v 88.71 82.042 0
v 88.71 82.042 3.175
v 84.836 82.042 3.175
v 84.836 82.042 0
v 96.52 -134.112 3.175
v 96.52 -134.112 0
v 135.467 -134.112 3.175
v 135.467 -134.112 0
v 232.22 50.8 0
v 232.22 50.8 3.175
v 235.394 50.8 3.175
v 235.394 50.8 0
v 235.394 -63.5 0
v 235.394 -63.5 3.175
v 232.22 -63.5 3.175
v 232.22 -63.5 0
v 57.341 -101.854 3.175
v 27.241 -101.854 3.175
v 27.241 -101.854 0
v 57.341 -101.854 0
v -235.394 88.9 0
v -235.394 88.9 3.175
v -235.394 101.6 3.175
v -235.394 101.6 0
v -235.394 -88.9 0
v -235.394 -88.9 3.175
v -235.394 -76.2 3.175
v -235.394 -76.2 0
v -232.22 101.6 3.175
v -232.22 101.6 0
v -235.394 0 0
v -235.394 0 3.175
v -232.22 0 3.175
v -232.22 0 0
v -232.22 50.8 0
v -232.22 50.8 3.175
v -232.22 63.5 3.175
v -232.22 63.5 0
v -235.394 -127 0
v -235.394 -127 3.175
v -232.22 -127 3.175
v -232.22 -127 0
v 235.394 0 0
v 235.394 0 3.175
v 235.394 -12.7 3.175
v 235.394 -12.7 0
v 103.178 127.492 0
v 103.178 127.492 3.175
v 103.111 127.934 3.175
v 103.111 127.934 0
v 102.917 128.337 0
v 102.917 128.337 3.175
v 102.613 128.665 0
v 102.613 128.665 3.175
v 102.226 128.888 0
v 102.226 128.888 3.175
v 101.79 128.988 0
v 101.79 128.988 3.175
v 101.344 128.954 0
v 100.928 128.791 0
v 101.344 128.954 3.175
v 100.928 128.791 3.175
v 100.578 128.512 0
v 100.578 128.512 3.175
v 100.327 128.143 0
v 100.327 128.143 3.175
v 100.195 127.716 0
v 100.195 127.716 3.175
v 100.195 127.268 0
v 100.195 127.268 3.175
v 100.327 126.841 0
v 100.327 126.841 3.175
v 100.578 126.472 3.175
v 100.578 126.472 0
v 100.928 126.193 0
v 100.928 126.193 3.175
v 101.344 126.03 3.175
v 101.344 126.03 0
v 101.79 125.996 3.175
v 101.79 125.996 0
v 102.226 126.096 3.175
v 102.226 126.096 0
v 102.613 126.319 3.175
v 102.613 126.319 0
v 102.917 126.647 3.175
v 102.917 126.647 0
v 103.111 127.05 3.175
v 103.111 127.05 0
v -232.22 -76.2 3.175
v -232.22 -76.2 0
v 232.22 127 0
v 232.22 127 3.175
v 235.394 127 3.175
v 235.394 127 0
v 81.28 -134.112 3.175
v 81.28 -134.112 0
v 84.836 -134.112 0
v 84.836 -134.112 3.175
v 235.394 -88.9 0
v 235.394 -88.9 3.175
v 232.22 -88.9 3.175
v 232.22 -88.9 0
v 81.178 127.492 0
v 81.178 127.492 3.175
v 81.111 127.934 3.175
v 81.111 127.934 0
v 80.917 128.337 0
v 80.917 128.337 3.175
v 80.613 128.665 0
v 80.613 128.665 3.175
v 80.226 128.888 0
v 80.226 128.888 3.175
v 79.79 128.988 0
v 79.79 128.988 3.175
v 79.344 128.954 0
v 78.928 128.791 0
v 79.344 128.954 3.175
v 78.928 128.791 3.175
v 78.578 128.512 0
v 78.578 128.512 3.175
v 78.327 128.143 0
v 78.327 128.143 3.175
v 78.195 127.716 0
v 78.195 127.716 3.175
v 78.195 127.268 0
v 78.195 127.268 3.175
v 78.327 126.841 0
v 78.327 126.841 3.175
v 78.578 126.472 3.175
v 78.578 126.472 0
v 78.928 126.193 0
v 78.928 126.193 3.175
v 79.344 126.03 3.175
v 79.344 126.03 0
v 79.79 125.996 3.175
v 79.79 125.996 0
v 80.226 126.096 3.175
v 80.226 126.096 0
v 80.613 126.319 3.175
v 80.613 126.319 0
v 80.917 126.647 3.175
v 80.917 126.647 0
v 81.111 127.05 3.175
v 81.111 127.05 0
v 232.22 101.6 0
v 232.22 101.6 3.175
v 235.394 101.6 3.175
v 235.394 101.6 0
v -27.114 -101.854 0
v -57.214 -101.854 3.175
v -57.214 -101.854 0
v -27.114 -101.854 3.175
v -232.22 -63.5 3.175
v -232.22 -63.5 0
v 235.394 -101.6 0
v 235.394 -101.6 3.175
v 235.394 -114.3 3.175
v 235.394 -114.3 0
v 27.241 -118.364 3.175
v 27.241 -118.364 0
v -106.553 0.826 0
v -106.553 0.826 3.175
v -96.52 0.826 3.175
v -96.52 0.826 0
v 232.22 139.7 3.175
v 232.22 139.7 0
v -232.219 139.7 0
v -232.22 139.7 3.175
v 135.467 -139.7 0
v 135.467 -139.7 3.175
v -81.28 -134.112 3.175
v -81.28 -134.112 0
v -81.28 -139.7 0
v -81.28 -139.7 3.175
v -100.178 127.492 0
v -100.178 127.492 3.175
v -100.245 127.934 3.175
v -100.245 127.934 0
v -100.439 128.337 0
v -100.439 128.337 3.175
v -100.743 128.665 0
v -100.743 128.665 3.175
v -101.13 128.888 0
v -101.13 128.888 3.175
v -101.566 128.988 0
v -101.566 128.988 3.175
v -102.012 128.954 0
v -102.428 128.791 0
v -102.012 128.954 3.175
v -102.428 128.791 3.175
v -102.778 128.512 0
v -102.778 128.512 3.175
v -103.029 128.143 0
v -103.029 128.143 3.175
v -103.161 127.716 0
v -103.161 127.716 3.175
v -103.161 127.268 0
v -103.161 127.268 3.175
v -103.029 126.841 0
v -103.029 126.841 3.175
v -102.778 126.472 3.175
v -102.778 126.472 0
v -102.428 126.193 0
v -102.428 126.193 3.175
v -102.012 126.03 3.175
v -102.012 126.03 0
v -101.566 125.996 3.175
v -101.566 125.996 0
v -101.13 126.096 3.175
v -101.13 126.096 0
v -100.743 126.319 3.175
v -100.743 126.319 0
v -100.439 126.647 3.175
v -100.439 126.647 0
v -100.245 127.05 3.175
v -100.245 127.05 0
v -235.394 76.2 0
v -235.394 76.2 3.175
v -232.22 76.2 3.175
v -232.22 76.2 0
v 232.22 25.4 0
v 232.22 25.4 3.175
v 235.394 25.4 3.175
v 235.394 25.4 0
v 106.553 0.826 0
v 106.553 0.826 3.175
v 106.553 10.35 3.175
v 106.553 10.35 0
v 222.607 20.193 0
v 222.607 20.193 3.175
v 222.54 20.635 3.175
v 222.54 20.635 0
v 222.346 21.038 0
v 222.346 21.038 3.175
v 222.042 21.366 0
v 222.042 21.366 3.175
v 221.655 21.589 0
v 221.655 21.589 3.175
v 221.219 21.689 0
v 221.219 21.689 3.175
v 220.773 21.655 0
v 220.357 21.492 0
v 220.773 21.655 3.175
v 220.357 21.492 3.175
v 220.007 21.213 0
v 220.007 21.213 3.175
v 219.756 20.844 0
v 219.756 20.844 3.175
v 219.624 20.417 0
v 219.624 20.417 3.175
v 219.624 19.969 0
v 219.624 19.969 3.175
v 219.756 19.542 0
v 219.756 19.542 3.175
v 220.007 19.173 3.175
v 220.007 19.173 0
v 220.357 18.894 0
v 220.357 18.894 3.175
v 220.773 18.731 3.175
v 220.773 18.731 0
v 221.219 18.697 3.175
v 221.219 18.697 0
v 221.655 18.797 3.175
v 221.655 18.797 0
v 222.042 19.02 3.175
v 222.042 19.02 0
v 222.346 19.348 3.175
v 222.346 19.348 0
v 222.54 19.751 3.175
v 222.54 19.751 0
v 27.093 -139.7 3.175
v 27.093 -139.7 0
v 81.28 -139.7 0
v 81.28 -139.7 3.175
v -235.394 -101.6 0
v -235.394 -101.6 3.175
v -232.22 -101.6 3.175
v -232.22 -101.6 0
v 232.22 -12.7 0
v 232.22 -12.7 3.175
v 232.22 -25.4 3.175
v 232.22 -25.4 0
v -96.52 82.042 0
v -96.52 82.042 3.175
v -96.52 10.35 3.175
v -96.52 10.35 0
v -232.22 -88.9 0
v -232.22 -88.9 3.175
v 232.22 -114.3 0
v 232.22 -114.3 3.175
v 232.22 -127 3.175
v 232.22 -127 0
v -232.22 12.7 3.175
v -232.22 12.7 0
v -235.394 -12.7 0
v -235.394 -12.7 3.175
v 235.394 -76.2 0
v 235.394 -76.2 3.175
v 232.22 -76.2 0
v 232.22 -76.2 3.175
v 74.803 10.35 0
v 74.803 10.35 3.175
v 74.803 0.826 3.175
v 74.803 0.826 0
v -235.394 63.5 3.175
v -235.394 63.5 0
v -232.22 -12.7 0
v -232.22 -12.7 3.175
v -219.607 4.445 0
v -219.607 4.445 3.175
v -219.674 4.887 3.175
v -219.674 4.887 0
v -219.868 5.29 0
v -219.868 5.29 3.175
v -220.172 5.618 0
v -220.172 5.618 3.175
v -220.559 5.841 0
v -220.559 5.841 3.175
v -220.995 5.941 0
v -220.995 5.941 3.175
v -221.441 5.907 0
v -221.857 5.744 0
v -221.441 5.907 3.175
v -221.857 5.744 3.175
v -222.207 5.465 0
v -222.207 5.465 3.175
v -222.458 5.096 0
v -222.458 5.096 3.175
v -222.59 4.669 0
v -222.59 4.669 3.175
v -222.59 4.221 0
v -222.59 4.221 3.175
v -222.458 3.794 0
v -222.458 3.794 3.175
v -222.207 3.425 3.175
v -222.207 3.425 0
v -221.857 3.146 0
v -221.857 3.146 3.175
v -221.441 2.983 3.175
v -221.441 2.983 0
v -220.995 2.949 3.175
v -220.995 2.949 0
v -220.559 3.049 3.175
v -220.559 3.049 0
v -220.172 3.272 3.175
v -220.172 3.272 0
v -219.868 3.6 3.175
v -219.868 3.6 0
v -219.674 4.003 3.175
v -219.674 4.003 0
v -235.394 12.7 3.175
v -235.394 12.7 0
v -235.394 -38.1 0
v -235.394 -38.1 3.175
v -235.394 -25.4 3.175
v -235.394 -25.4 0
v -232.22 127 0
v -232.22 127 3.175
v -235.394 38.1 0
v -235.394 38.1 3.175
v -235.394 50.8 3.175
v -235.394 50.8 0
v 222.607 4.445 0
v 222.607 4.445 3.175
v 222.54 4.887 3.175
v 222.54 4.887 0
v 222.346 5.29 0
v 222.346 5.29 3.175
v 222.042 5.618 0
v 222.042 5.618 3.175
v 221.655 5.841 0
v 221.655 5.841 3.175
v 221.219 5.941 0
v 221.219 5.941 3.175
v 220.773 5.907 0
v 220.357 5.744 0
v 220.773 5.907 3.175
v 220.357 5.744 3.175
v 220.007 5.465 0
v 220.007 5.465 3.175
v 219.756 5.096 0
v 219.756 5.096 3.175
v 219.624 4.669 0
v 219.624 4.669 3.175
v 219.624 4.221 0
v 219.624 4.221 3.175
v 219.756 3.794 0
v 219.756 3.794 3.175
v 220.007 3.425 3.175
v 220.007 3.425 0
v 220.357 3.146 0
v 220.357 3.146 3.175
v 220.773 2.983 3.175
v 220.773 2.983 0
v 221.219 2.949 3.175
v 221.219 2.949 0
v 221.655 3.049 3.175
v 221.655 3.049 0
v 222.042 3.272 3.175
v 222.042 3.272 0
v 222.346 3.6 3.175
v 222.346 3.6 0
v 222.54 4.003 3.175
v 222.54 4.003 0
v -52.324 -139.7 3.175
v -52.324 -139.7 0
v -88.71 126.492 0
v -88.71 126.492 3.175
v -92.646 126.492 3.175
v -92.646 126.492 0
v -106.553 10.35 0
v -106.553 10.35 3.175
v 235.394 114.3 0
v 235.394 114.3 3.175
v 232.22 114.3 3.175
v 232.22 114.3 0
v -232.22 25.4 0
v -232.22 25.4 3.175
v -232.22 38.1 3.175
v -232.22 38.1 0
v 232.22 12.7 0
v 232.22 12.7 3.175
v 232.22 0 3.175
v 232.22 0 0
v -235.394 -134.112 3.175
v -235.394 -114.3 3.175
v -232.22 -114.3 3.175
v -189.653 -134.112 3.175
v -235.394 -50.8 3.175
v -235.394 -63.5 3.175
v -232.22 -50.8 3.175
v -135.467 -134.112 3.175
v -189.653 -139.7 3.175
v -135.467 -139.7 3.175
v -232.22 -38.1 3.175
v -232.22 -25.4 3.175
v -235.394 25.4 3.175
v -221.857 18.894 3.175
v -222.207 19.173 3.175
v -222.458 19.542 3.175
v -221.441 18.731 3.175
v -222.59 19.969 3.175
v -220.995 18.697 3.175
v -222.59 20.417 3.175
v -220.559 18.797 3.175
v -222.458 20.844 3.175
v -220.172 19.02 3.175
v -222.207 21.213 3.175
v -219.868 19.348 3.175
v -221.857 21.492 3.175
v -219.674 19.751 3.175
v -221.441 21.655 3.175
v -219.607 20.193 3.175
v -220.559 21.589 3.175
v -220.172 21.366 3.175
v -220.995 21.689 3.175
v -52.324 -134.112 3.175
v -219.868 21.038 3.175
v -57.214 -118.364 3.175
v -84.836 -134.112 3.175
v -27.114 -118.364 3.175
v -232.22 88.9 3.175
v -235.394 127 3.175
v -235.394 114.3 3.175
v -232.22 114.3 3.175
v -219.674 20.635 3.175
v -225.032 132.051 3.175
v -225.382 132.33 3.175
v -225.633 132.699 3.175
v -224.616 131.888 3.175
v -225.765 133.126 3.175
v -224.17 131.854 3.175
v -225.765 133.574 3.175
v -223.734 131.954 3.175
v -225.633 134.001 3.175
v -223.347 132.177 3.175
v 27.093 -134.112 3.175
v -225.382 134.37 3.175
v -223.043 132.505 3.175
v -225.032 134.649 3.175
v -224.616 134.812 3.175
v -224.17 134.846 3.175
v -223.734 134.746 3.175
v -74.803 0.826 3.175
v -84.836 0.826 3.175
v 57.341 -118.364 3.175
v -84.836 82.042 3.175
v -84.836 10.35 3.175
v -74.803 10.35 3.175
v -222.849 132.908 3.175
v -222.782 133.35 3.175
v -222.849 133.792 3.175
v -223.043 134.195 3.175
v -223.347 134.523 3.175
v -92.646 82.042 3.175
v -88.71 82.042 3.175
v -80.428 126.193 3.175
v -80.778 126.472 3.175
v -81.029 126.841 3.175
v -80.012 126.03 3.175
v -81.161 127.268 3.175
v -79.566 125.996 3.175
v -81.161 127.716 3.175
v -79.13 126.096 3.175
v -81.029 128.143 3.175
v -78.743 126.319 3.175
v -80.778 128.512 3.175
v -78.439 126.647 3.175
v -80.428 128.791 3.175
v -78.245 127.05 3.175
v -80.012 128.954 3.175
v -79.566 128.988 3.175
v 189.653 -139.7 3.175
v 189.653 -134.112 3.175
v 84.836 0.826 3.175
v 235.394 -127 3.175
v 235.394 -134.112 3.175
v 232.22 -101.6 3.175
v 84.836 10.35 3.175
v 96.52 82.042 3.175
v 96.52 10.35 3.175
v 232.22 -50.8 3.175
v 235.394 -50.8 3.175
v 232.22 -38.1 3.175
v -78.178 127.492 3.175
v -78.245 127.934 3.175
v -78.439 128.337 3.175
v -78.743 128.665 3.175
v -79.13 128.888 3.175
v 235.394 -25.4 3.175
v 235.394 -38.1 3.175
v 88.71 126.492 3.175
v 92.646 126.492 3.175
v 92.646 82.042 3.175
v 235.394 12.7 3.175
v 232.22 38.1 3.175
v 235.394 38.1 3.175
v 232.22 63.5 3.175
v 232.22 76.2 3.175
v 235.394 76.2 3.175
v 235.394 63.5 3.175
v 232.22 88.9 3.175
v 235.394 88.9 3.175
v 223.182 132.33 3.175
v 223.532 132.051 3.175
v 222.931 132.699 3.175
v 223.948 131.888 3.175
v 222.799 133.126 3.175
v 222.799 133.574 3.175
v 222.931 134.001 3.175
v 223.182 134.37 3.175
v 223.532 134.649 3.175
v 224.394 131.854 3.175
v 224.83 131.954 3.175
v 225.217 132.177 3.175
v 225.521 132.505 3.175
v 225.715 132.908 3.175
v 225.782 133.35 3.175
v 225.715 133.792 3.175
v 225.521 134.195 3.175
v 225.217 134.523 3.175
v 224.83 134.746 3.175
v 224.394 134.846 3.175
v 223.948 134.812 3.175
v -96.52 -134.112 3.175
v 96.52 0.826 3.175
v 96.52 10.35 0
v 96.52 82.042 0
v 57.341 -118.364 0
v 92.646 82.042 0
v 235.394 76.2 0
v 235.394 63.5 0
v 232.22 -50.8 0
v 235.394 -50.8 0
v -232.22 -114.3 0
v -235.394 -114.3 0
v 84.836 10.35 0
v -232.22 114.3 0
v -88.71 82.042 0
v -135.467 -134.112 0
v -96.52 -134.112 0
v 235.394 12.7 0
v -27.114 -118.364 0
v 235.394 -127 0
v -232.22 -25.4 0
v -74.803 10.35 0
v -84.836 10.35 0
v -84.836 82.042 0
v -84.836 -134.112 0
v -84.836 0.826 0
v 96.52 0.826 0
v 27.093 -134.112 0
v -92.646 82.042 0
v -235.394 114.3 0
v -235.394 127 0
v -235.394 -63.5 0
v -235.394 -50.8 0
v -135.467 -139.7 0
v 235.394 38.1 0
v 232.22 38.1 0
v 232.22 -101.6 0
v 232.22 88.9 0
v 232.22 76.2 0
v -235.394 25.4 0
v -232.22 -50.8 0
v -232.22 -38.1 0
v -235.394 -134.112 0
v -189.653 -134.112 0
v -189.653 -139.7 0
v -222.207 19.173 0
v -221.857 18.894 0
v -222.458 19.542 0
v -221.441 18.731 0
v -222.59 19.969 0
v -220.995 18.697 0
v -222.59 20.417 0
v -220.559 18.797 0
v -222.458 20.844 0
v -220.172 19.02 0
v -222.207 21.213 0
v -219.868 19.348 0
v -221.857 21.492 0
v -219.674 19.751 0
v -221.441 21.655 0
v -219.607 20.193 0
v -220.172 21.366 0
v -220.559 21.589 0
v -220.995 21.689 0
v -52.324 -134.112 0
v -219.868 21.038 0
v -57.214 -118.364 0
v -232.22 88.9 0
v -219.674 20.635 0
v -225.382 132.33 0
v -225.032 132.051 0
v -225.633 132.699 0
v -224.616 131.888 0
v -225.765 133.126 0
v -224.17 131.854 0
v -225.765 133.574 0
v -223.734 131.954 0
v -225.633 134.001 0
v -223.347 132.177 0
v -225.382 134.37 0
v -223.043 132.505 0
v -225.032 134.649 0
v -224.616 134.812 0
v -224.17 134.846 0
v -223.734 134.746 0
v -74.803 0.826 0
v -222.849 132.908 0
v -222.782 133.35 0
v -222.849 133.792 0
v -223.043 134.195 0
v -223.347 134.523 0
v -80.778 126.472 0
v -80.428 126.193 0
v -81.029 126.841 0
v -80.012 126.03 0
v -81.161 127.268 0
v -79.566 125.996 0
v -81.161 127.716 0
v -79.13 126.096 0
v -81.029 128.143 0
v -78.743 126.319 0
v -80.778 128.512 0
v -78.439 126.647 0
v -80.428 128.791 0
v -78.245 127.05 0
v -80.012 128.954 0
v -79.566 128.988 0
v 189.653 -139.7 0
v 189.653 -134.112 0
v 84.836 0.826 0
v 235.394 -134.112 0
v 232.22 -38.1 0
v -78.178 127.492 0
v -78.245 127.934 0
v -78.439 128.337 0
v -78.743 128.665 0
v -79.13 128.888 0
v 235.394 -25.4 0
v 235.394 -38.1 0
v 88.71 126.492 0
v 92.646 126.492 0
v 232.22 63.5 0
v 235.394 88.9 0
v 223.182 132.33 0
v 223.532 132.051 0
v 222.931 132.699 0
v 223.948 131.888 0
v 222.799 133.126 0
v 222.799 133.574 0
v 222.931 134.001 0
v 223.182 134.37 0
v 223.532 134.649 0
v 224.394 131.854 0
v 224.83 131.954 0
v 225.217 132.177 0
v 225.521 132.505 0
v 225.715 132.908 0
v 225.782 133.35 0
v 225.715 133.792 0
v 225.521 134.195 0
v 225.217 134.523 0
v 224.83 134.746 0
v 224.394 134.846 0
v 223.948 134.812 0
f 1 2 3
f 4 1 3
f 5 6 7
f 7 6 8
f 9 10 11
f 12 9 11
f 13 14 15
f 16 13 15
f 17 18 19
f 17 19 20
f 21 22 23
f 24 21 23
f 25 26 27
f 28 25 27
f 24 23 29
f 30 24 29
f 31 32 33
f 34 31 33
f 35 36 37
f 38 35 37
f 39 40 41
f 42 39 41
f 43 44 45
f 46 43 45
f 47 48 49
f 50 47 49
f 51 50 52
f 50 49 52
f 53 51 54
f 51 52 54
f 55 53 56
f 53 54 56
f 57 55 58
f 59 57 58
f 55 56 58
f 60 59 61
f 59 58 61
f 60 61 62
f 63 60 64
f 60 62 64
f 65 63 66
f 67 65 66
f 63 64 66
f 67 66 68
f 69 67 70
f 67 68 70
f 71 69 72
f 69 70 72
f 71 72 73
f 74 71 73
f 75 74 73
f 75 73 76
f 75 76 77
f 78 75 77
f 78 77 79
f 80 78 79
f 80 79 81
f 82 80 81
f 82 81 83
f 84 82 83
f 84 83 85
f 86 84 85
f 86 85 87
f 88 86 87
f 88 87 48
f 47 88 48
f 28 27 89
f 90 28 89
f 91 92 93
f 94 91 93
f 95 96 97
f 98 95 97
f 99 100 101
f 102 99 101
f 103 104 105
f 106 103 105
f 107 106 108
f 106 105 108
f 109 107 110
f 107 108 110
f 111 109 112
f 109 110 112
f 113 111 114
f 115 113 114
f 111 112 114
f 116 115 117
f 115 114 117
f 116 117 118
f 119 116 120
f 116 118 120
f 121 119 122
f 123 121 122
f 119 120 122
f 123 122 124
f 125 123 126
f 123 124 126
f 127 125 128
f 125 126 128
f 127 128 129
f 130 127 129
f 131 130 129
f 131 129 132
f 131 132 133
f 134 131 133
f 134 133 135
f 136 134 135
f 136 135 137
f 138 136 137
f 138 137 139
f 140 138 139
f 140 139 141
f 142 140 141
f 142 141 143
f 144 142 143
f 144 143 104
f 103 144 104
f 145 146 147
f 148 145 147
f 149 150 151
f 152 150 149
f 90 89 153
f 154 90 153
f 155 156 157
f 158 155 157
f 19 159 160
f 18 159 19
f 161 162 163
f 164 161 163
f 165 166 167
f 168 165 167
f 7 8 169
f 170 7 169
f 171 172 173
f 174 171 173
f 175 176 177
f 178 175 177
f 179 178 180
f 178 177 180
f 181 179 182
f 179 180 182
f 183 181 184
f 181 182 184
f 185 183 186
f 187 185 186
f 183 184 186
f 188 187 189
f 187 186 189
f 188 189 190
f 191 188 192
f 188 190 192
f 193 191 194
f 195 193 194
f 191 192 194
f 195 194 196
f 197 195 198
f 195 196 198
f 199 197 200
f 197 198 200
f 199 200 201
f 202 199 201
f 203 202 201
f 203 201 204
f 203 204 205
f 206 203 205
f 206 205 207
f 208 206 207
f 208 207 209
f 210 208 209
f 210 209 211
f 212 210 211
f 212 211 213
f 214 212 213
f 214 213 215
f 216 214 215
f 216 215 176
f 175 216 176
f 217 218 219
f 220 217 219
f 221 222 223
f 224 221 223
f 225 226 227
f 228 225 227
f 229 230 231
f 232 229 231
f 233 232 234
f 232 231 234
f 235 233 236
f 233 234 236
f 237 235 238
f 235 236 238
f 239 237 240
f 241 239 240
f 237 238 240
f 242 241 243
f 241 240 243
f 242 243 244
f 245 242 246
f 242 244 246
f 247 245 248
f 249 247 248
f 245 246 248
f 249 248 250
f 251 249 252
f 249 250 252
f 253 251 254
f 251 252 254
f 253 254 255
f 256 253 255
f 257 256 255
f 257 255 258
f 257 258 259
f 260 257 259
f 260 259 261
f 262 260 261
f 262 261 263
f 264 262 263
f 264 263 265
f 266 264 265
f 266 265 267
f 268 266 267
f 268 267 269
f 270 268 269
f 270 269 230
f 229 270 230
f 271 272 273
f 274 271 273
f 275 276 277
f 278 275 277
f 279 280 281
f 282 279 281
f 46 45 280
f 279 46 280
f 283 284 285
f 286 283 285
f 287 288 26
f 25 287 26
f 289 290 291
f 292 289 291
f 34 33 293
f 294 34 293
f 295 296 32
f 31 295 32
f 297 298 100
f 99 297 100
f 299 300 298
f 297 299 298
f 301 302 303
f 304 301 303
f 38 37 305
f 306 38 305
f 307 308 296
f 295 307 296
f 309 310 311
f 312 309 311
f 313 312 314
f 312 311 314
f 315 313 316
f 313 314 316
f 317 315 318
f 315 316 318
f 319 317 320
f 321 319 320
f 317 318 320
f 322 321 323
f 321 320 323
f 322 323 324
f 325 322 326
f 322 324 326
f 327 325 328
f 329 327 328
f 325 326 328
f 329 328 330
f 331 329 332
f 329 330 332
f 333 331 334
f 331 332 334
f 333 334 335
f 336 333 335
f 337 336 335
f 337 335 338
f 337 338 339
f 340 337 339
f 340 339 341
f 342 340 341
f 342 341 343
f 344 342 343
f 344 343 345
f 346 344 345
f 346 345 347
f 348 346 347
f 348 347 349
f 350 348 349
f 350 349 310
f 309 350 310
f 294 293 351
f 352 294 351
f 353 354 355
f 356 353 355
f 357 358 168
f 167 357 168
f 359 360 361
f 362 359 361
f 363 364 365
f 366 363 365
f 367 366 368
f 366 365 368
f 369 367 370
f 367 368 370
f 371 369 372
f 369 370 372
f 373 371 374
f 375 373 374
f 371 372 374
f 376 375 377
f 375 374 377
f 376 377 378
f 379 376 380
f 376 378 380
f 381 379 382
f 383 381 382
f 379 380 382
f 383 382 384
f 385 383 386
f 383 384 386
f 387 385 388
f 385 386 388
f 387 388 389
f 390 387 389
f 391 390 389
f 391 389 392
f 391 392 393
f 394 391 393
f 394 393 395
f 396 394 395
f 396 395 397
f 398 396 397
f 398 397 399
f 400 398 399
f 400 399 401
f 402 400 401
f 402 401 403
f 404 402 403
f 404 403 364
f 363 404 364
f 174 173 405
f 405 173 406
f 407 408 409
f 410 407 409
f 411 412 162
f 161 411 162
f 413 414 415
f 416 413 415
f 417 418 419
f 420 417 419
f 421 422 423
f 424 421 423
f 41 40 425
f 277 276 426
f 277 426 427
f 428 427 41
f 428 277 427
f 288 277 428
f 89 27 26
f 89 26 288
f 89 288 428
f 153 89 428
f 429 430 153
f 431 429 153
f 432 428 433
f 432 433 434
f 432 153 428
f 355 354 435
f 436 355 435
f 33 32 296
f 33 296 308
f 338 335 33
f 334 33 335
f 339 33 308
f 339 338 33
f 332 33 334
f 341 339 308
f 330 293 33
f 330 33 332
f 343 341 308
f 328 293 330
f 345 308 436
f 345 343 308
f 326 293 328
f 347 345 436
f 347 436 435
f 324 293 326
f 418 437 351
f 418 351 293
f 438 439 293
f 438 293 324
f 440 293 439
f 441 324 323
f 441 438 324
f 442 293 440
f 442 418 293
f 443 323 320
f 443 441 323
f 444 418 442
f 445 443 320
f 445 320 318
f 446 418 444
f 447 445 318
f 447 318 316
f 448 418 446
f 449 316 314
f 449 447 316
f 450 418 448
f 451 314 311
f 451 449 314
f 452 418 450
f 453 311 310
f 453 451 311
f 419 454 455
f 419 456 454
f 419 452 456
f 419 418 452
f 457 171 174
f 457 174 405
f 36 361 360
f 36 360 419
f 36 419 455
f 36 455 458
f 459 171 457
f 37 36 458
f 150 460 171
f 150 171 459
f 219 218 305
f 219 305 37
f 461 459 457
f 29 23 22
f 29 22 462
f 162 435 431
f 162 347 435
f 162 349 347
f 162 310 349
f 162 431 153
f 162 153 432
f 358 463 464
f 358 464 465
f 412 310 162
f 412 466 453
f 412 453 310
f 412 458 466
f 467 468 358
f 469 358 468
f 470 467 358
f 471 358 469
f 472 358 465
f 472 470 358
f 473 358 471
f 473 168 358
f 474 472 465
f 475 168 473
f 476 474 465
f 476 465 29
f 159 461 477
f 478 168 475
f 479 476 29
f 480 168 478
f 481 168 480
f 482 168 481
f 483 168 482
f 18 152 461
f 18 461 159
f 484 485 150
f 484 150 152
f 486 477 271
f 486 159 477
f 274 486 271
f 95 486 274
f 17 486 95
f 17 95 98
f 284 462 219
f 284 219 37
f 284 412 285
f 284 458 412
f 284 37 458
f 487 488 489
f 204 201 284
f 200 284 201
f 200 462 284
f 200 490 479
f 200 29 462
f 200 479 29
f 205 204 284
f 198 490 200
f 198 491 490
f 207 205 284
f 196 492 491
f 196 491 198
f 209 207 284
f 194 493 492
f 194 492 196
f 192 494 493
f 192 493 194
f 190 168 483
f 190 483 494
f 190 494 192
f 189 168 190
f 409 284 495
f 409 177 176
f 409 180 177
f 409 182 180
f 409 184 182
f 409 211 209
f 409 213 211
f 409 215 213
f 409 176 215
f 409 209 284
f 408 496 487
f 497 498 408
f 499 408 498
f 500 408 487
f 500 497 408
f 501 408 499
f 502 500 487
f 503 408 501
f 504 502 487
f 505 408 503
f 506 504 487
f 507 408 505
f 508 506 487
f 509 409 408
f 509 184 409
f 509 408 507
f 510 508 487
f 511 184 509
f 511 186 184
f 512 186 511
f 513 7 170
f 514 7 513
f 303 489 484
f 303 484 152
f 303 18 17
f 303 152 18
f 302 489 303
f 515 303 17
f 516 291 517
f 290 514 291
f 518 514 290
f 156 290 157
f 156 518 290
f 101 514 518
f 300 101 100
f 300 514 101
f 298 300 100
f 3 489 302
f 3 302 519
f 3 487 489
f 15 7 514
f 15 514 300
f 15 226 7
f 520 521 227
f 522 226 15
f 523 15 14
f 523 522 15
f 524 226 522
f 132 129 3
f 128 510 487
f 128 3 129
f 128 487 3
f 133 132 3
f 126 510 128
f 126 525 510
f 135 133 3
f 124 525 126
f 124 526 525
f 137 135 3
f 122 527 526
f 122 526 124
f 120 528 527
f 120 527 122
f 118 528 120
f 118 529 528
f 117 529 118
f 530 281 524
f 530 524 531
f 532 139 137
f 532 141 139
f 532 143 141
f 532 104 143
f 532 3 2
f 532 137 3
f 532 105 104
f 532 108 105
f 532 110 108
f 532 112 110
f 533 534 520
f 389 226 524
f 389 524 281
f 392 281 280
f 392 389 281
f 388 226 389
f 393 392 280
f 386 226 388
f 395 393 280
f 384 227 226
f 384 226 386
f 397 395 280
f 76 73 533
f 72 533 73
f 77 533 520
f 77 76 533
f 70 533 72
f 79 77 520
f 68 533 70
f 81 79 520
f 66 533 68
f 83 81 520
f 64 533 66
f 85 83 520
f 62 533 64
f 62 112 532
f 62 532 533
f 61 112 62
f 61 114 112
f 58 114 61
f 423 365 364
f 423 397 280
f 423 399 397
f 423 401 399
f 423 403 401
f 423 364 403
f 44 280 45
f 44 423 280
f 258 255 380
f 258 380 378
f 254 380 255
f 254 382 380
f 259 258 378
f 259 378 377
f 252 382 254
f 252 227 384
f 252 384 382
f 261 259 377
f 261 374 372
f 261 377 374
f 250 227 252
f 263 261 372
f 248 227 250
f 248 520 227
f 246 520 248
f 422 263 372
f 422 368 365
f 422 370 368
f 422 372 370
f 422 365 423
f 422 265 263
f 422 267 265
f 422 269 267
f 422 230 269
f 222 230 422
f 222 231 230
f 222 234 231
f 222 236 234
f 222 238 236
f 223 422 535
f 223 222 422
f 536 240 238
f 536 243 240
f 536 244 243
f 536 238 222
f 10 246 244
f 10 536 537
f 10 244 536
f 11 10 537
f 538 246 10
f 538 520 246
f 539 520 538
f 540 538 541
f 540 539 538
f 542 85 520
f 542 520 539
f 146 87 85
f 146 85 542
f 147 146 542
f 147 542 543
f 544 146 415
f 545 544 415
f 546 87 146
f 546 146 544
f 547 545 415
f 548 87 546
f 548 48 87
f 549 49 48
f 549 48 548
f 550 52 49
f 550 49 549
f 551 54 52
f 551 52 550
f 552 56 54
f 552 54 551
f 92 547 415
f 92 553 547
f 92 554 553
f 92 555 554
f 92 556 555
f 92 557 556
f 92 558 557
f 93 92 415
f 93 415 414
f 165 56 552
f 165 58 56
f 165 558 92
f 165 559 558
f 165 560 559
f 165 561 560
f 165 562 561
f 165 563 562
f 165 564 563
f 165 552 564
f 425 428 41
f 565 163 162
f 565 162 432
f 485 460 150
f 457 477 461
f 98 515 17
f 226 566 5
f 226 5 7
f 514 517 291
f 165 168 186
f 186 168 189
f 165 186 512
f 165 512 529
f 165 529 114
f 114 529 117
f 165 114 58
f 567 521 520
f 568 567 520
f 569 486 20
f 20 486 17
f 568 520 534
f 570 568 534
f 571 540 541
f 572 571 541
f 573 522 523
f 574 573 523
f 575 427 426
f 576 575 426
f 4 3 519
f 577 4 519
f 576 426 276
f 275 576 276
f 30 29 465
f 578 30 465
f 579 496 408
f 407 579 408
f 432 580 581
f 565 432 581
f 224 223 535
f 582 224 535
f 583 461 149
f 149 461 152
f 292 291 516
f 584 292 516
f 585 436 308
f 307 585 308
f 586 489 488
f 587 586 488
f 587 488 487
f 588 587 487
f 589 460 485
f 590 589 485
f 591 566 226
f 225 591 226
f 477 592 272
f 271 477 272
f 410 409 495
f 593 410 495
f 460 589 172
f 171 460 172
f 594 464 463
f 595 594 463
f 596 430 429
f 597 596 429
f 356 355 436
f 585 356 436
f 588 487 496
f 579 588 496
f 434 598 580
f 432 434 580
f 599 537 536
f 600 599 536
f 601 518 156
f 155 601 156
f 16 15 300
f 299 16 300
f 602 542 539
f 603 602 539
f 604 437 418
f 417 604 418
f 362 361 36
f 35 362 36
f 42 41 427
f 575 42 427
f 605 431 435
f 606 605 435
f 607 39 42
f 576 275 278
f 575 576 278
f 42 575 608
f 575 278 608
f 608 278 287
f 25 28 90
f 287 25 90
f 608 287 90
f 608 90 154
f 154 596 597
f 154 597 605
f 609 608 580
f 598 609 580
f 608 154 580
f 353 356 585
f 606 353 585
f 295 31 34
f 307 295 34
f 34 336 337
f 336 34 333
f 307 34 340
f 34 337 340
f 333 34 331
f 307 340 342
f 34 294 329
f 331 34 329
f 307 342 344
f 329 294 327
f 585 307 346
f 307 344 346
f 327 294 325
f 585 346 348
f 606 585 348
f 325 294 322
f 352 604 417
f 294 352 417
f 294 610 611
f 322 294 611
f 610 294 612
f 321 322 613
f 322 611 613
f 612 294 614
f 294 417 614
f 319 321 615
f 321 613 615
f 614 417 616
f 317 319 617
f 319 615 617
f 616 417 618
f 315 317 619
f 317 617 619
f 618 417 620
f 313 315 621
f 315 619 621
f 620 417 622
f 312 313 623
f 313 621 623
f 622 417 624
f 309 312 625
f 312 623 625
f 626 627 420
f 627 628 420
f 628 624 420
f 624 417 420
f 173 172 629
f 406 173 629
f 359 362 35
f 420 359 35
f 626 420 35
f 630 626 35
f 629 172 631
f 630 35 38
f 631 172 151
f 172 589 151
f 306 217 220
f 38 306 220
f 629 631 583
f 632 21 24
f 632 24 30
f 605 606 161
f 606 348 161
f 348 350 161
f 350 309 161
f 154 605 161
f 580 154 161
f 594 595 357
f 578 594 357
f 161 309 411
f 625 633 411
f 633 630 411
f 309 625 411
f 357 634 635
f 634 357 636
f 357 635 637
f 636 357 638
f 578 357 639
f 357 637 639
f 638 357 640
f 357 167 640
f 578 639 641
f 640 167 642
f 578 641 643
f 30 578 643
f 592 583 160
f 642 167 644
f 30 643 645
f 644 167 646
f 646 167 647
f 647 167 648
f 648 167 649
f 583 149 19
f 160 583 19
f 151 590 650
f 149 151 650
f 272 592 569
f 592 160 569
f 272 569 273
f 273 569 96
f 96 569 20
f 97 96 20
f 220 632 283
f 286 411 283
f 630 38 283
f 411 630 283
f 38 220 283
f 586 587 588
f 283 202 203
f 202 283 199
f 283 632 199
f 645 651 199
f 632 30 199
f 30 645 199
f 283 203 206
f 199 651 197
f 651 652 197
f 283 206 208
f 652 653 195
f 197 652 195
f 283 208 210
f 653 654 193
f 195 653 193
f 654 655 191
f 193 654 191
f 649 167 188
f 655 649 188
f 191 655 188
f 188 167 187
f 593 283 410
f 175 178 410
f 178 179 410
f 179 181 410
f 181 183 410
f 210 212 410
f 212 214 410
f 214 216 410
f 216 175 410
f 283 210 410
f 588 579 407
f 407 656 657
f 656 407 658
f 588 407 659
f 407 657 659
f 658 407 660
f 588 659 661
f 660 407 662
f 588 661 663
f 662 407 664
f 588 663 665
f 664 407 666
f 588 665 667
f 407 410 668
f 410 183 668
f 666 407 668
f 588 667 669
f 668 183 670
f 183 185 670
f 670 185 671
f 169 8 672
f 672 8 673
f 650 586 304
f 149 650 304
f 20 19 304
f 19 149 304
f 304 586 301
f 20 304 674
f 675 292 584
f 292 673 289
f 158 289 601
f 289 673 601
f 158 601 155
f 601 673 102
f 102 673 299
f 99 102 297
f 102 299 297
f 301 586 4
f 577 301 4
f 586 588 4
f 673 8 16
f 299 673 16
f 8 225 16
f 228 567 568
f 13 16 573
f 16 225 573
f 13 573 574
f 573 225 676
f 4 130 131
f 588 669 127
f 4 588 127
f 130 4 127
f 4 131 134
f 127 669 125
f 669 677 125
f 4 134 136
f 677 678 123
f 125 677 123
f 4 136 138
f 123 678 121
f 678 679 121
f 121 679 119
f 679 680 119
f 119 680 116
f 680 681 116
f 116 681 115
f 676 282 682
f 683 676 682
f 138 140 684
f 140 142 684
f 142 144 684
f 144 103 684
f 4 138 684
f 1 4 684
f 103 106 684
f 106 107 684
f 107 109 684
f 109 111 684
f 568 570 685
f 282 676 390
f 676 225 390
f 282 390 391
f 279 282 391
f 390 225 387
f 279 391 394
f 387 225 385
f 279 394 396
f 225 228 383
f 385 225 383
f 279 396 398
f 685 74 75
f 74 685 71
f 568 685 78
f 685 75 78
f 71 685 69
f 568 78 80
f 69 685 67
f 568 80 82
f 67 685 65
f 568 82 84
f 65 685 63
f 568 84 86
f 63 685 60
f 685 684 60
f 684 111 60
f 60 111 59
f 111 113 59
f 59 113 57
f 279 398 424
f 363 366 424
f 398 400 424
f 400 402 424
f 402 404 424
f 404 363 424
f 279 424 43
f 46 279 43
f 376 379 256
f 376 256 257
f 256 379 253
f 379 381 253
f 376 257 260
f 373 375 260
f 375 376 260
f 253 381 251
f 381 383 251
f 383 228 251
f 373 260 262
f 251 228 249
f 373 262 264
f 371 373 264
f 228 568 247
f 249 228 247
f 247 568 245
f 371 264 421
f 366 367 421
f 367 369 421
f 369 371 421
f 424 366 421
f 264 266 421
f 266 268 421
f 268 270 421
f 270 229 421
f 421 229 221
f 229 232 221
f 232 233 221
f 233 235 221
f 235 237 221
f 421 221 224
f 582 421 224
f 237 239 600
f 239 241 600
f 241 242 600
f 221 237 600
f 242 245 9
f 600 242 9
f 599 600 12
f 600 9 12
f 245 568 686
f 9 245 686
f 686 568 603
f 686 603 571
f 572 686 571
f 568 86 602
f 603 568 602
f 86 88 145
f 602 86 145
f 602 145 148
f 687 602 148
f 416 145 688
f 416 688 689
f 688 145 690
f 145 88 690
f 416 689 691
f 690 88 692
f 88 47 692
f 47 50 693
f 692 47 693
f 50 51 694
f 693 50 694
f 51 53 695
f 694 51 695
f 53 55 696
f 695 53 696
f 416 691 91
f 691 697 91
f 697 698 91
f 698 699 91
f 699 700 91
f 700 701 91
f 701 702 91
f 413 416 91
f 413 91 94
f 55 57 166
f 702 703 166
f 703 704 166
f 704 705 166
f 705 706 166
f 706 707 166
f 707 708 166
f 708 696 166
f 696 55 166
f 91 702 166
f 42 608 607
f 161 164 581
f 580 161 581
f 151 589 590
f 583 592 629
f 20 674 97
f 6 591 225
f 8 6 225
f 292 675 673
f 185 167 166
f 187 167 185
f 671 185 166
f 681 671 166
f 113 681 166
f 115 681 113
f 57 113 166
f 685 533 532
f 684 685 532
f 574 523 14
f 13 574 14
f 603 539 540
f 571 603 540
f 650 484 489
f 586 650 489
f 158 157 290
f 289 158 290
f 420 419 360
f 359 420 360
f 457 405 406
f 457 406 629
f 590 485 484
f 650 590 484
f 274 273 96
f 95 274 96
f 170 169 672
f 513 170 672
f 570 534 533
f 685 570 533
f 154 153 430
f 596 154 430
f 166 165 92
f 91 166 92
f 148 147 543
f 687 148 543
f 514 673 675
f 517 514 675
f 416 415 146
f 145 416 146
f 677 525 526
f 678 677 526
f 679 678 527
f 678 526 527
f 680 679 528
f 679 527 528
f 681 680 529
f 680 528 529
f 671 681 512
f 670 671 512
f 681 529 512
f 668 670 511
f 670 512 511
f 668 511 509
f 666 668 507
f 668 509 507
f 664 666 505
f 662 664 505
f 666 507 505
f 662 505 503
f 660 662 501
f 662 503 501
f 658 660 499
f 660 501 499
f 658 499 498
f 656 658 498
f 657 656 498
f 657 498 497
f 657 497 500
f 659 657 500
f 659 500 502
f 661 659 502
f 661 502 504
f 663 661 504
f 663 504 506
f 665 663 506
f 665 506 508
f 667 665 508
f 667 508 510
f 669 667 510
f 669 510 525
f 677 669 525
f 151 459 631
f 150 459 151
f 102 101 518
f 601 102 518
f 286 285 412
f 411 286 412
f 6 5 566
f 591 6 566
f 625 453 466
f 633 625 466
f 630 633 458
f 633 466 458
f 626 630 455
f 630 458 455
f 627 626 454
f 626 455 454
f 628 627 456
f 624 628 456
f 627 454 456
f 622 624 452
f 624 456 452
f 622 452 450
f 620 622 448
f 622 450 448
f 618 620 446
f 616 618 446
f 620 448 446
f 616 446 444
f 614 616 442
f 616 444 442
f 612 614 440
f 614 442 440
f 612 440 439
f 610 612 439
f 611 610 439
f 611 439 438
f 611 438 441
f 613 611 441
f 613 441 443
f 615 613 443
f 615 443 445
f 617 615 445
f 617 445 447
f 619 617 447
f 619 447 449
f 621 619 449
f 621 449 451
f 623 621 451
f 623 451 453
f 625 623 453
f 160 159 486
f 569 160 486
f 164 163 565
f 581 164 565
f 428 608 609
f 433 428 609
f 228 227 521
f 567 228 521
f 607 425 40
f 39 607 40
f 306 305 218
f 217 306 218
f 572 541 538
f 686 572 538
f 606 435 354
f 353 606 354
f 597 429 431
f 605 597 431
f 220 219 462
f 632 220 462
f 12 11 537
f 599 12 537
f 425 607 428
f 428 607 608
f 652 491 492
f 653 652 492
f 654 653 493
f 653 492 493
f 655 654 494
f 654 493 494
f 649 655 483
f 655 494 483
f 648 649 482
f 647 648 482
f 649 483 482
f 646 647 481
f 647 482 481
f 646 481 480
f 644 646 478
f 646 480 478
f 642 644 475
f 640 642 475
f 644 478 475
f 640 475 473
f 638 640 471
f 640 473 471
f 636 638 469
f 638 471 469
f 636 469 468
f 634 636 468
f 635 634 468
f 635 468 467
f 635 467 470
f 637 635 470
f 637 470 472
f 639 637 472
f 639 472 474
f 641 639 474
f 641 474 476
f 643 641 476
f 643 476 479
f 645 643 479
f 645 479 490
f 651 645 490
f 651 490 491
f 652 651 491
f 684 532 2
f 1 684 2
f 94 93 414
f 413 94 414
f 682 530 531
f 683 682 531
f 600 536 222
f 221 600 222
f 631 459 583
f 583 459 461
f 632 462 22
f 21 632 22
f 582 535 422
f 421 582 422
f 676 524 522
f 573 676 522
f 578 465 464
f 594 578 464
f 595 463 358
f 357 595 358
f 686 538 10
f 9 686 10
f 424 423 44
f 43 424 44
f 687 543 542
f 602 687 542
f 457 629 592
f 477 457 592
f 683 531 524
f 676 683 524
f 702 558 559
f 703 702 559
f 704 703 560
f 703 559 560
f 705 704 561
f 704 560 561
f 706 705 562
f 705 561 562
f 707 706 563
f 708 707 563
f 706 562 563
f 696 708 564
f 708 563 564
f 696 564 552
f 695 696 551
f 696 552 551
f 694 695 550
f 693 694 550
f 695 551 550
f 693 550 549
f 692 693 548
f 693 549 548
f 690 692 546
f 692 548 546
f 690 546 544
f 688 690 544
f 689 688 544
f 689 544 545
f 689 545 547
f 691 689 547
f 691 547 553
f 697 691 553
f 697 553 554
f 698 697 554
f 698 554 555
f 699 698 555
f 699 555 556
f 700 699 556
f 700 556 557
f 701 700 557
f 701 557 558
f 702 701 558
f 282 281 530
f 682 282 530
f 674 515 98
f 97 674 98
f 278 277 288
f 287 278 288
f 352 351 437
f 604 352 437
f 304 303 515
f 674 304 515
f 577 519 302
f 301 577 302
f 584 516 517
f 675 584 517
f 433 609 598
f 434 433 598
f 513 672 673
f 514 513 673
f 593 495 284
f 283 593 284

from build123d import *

# Parameters (mm, degrees)
SKETCH1_W                    = 3.175
SKETCH1_H                    = 12.7
MAIN_EXTRUDE_DEPTH           = 3.175
SKETCH8_R                    = 1.5
SKETCH8_W                    = 3.175
SKETCH8_H                    = 31.877
MOUNT_HOLES_DEPTH            = 430.752406189
DOOR_SLOTS_DEPTH             = 430.752406189
SKETCH10_R                   = 1.5
DOOR_GUIDE_MOUNT_HOLES_DEPTH = 430.752406189
SKETCH12_R                   = 1.5
EXTENSION_CLIP_HOLES_DEPTH   = 430.752406189
EXTENSION_CENTER_CUT_DEPTH   = 430.752406189
SKETCH17_W                   = 30.1
SKETCH17_H                   = 16.51
SKETCH17_W_2                 = 25.230666667
SKETCH17_H_2                 = 5.588
NOSEPOKES_SCOPED_DEPTH       = 274.745760251


with BuildPart() as part:
    # Sketch1 → Main Extrude (new body)
    with BuildSketch(Plane.XY):
        Polygon((-381, 139.7), (-406.4, 139.7), (-406.4, -139.7), (-352.213333333, -139.7), (-352.213333333, -134.112), (-298.026666667, -134.112), (-298.026666667, -139.7), (-243.84, -139.7), (-243.84, -134.112), (-189.653333333, -134.112), (-189.653333333, -139.7), (-135.466666667, -139.7), (-135.466666667, -134.112), (-81.28, -134.112), (-81.28, -139.7), (-27.093333333, -139.7), (-27.093333333, -134.112), (27.093333333, -134.112), (27.093333333, -139.7), (81.28, -139.7), (81.28, -134.112), (135.466666667, -134.112), (135.466666667, -139.7), (189.653333333, -139.7), (189.653333333, -134.112), (243.84, -134.112), (243.84, -139.7), (298.026666667, -139.7), (298.026666667, -134.112), (352.213333333, -134.112), (352.213333333, -139.7), (406.4, -139.7), (406.4, 139.7), (381, 139.7), (381, 127), (377.825, 127), (377.825, 139.7), (-377.825, 139.7), (-377.825, 127), (-381, 127), align=None)
        with Locations((-379.4125, 107.95)):
            Rectangle(SKETCH1_W, SKETCH1_H, mode=Mode.SUBTRACT)
        with Locations((-379.4125, 82.55)):
            Rectangle(SKETCH1_W, SKETCH1_H, mode=Mode.SUBTRACT)
        with Locations((-379.4125, 57.15)):
            Rectangle(SKETCH1_W, SKETCH1_H, mode=Mode.SUBTRACT)
        with Locations((-379.4125, 31.75)):
            Rectangle(SKETCH1_W, SKETCH1_H, mode=Mode.SUBTRACT)
        with Locations((-379.4125, 6.35)):
            Rectangle(SKETCH1_W, SKETCH1_H, mode=Mode.SUBTRACT)
        with Locations((-379.4125, -19.05)):
            Rectangle(SKETCH1_W, SKETCH1_H, mode=Mode.SUBTRACT)
        with Locations((-379.4125, -44.45)):
            Rectangle(SKETCH1_W, SKETCH1_H, mode=Mode.SUBTRACT)
        with Locations((-379.4125, -69.85)):
            Rectangle(SKETCH1_W, SKETCH1_H, mode=Mode.SUBTRACT)
        with Locations((-379.4125, -95.25)):
            Rectangle(SKETCH1_W, SKETCH1_H, mode=Mode.SUBTRACT)
        with Locations((-379.4125, -120.65)):
            Rectangle(SKETCH1_W, SKETCH1_H, mode=Mode.SUBTRACT)
        with Locations((379.4125, 107.95)):
            Rectangle(SKETCH1_W, SKETCH1_H, mode=Mode.SUBTRACT)
        with Locations((379.4125, 82.55)):
            Rectangle(SKETCH1_W, SKETCH1_H, mode=Mode.SUBTRACT)
        with Locations((379.4125, 57.15)):
            Rectangle(SKETCH1_W, SKETCH1_H, mode=Mode.SUBTRACT)
        with Locations((379.4125, 31.75)):
            Rectangle(SKETCH1_W, SKETCH1_H, mode=Mode.SUBTRACT)
        with Locations((379.4125, 6.35)):
            Rectangle(SKETCH1_W, SKETCH1_H, mode=Mode.SUBTRACT)
        with Locations((379.4125, -19.05)):
            Rectangle(SKETCH1_W, SKETCH1_H, mode=Mode.SUBTRACT)
        with Locations((379.4125, -44.45)):
            Rectangle(SKETCH1_W, SKETCH1_H, mode=Mode.SUBTRACT)
        with Locations((379.4125, -69.85)):
            Rectangle(SKETCH1_W, SKETCH1_H, mode=Mode.SUBTRACT)
        with Locations((379.4125, -95.25)):
            Rectangle(SKETCH1_W, SKETCH1_H, mode=Mode.SUBTRACT)
        with Locations((379.4125, -120.65)):
            Rectangle(SKETCH1_W, SKETCH1_H, mode=Mode.SUBTRACT)
    extrude(amount=MAIN_EXTRUDE_DEPTH)

    # Sketch8 → Mount Holes (cut, through all)
    with BuildSketch(Plane.XY.offset(3.175)):
        with Locations((-393.7, -120.65)):
            Circle(SKETCH8_R)
        with Locations((393.7, -120.65)):
            Circle(SKETCH8_R)
        with Locations((-382.5875, 12.319)):
            Rectangle(SKETCH8_W, SKETCH8_H)
        with Locations((382.5875, 12.319)):
            Rectangle(SKETCH8_W, SKETCH8_H)
    extrude(amount=-MOUNT_HOLES_DEPTH, mode=Mode.SUBTRACT)

    # Sketch3 → Door Slots (cut, through all)
    with BuildSketch(Plane.XY.offset(3.175)):
        Polygon((-88.7095, 126.492), (-92.6465, 126.492), (-92.6465, 82.042), (-96.52, 82.042), (-96.52, 10.3505), (-106.553, 10.3505), (-106.553, 0.8255), (-96.52, 0.8255), (-96.52, -134.112), (-84.836, -134.112), (-84.836, 0.8255), (-74.803, 0.8255), (-74.803, 10.3505), (-84.836, 10.3505), (-84.836, 82.042), (-88.7095, 82.042), align=None)
        Polygon((92.6465, 126.492), (88.7095, 126.492), (88.7095, 82.042), (84.836, 82.042), (84.836, 10.3505), (74.803, 10.3505), (74.803, 0.8255), (84.836, 0.8255), (84.836, -134.112), (96.52, -134.112), (96.52, 0.8255), (106.553, 0.8255), (106.553, 10.3505), (96.52, 10.3505), (96.52, 82.042), (92.6465, 82.042), align=None)
    extrude(amount=-DOOR_SLOTS_DEPTH, mode=Mode.SUBTRACT)

    # Sketch10 → Door Guide Mount Holes (cut, through all)
    with BuildSketch(Plane.XY.offset(3.175)):
        with Locations((-101.678, 127.492)):
            Circle(SKETCH10_R)
        with Locations((-79.678, 127.492)):
            Circle(SKETCH10_R)
        with Locations((79.678, 127.492)):
            Circle(SKETCH10_R)
        with Locations((101.678, 127.492)):
            Circle(SKETCH10_R)
    extrude(amount=-DOOR_GUIDE_MOUNT_HOLES_DEPTH, mode=Mode.SUBTRACT)

    # Sketch12 → Extension Clip Holes (cut, through all)
    with BuildSketch(Plane.XY.offset(3.175)):
        with Locations((-246.507, 20.193)):
            Circle(SKETCH12_R)
        with Locations((-246.507, 4.445)):
            Circle(SKETCH12_R)
        with Locations((-221.107, 4.445)):
            Circle(SKETCH12_R)
        with Locations((-221.107, 20.193)):
            Circle(SKETCH12_R)
        with Locations((-243.332, 133.35)):
            Circle(SKETCH12_R)
        with Locations((-224.282, 133.35)):
            Circle(SKETCH12_R)
        with Locations((224.282, 133.35)):
            Circle(SKETCH12_R)
        with Locations((243.332, 133.35)):
            Circle(SKETCH12_R)
        with Locations((221.107, 20.193)):
            Circle(SKETCH12_R)
        with Locations((221.107, 4.445)):
            Circle(SKETCH12_R)
        with Locations((246.507, 4.445)):
            Circle(SKETCH12_R)
        with Locations((246.507, 20.193)):
            Circle(SKETCH12_R)
    extrude(amount=-EXTENSION_CLIP_HOLES_DEPTH, mode=Mode.SUBTRACT)

    # Sketch11<3> → Extension Center Cut (cut, through all)
    with BuildSketch(Plane.XY.offset(3.175)):
        Polygon((-232.2195, 127), (-232.2195, 139.7), (-406.4, 139.7), (-406.4, -139.7), (-235.3945, -139.7), (-235.3945, -127), (-232.2195, -127), (-232.2195, -114.3), (-235.3945, -114.3), (-235.3945, -101.6), (-232.2195, -101.6), (-232.2195, -88.9), (-235.3945, -88.9), (-235.3945, -76.2), (-232.2195, -76.2), (-232.2195, -63.5), (-235.3945, -63.5), (-235.3945, -50.8), (-232.2195, -50.8), (-232.2195, -38.1), (-235.3945, -38.1), (-235.3945, -25.4), (-232.2195, -25.4), (-232.2195, -12.7), (-235.3945, -12.7), (-235.3945, 0), (-232.2195, 0), (-232.2195, 12.7), (-235.3945, 12.7), (-235.3945, 25.4), (-232.2195, 25.4), (-232.2195, 38.1), (-235.3945, 38.1), (-235.3945, 50.8), (-232.2195, 50.8), (-232.2195, 63.5), (-235.3945, 63.5), (-235.3945, 76.2), (-232.2195, 76.2), (-232.2195, 88.9), (-235.3945, 88.9), (-235.3945, 101.6), (-232.2195, 101.6), (-232.2195, 114.3), (-235.3945, 114.3), (-235.3945, 127), align=None)
        Polygon((406.4, 139.7), (232.2195, 139.7), (232.2195, 127), (235.3945, 127), (235.3945, 114.3), (232.2195, 114.3), (232.2195, 101.6), (235.3945, 101.6), (235.3945, 88.9), (232.2195, 88.9), (232.2195, 76.2), (235.3945, 76.2), (235.3945, 63.5), (232.2195, 63.5), (232.2195, 50.8), (235.3945, 50.8), (235.3945, 38.1), (232.2195, 38.1), (232.2195, 25.4), (235.3945, 25.4), (235.3945, 12.7), (232.2195, 12.7), (232.2195, 0), (235.3945, 0), (235.3945, -12.7), (232.2195, -12.7), (232.2195, -25.4), (235.3945, -25.4), (235.3945, -38.1), (232.2195, -38.1), (232.2195, -50.8), (235.3945, -50.8), (235.3945, -63.5), (232.2195, -63.5), (232.2195, -76.2), (235.3945, -76.2), (235.3945, -88.9), (232.2195, -88.9), (232.2195, -101.6), (235.3945, -101.6), (235.3945, -114.3), (232.2195, -114.3), (232.2195, -127), (235.3945, -127), (235.3945, -139.7), (406.4, -139.7), align=None)
    extrude(amount=-EXTENSION_CENTER_CUT_DEPTH, mode=Mode.SUBTRACT)

    # Sketch17 → nosepokes_scoped (cut, through all)
    with BuildSketch(Plane.XY.offset(3.175)):
        with Locations((42.291, -110.109)):
            Rectangle(SKETCH17_W, SKETCH17_H)
        with Locations((-42.164, -110.109)):
            Rectangle(SKETCH17_W, SKETCH17_H)
        with Locations((-39.708666667, -136.906)):
            Rectangle(SKETCH17_W_2, SKETCH17_H_2)
    extrude(amount=-NOSEPOKES_SCOPED_DEPTH, mode=Mode.SUBTRACT)


solid = part.part
